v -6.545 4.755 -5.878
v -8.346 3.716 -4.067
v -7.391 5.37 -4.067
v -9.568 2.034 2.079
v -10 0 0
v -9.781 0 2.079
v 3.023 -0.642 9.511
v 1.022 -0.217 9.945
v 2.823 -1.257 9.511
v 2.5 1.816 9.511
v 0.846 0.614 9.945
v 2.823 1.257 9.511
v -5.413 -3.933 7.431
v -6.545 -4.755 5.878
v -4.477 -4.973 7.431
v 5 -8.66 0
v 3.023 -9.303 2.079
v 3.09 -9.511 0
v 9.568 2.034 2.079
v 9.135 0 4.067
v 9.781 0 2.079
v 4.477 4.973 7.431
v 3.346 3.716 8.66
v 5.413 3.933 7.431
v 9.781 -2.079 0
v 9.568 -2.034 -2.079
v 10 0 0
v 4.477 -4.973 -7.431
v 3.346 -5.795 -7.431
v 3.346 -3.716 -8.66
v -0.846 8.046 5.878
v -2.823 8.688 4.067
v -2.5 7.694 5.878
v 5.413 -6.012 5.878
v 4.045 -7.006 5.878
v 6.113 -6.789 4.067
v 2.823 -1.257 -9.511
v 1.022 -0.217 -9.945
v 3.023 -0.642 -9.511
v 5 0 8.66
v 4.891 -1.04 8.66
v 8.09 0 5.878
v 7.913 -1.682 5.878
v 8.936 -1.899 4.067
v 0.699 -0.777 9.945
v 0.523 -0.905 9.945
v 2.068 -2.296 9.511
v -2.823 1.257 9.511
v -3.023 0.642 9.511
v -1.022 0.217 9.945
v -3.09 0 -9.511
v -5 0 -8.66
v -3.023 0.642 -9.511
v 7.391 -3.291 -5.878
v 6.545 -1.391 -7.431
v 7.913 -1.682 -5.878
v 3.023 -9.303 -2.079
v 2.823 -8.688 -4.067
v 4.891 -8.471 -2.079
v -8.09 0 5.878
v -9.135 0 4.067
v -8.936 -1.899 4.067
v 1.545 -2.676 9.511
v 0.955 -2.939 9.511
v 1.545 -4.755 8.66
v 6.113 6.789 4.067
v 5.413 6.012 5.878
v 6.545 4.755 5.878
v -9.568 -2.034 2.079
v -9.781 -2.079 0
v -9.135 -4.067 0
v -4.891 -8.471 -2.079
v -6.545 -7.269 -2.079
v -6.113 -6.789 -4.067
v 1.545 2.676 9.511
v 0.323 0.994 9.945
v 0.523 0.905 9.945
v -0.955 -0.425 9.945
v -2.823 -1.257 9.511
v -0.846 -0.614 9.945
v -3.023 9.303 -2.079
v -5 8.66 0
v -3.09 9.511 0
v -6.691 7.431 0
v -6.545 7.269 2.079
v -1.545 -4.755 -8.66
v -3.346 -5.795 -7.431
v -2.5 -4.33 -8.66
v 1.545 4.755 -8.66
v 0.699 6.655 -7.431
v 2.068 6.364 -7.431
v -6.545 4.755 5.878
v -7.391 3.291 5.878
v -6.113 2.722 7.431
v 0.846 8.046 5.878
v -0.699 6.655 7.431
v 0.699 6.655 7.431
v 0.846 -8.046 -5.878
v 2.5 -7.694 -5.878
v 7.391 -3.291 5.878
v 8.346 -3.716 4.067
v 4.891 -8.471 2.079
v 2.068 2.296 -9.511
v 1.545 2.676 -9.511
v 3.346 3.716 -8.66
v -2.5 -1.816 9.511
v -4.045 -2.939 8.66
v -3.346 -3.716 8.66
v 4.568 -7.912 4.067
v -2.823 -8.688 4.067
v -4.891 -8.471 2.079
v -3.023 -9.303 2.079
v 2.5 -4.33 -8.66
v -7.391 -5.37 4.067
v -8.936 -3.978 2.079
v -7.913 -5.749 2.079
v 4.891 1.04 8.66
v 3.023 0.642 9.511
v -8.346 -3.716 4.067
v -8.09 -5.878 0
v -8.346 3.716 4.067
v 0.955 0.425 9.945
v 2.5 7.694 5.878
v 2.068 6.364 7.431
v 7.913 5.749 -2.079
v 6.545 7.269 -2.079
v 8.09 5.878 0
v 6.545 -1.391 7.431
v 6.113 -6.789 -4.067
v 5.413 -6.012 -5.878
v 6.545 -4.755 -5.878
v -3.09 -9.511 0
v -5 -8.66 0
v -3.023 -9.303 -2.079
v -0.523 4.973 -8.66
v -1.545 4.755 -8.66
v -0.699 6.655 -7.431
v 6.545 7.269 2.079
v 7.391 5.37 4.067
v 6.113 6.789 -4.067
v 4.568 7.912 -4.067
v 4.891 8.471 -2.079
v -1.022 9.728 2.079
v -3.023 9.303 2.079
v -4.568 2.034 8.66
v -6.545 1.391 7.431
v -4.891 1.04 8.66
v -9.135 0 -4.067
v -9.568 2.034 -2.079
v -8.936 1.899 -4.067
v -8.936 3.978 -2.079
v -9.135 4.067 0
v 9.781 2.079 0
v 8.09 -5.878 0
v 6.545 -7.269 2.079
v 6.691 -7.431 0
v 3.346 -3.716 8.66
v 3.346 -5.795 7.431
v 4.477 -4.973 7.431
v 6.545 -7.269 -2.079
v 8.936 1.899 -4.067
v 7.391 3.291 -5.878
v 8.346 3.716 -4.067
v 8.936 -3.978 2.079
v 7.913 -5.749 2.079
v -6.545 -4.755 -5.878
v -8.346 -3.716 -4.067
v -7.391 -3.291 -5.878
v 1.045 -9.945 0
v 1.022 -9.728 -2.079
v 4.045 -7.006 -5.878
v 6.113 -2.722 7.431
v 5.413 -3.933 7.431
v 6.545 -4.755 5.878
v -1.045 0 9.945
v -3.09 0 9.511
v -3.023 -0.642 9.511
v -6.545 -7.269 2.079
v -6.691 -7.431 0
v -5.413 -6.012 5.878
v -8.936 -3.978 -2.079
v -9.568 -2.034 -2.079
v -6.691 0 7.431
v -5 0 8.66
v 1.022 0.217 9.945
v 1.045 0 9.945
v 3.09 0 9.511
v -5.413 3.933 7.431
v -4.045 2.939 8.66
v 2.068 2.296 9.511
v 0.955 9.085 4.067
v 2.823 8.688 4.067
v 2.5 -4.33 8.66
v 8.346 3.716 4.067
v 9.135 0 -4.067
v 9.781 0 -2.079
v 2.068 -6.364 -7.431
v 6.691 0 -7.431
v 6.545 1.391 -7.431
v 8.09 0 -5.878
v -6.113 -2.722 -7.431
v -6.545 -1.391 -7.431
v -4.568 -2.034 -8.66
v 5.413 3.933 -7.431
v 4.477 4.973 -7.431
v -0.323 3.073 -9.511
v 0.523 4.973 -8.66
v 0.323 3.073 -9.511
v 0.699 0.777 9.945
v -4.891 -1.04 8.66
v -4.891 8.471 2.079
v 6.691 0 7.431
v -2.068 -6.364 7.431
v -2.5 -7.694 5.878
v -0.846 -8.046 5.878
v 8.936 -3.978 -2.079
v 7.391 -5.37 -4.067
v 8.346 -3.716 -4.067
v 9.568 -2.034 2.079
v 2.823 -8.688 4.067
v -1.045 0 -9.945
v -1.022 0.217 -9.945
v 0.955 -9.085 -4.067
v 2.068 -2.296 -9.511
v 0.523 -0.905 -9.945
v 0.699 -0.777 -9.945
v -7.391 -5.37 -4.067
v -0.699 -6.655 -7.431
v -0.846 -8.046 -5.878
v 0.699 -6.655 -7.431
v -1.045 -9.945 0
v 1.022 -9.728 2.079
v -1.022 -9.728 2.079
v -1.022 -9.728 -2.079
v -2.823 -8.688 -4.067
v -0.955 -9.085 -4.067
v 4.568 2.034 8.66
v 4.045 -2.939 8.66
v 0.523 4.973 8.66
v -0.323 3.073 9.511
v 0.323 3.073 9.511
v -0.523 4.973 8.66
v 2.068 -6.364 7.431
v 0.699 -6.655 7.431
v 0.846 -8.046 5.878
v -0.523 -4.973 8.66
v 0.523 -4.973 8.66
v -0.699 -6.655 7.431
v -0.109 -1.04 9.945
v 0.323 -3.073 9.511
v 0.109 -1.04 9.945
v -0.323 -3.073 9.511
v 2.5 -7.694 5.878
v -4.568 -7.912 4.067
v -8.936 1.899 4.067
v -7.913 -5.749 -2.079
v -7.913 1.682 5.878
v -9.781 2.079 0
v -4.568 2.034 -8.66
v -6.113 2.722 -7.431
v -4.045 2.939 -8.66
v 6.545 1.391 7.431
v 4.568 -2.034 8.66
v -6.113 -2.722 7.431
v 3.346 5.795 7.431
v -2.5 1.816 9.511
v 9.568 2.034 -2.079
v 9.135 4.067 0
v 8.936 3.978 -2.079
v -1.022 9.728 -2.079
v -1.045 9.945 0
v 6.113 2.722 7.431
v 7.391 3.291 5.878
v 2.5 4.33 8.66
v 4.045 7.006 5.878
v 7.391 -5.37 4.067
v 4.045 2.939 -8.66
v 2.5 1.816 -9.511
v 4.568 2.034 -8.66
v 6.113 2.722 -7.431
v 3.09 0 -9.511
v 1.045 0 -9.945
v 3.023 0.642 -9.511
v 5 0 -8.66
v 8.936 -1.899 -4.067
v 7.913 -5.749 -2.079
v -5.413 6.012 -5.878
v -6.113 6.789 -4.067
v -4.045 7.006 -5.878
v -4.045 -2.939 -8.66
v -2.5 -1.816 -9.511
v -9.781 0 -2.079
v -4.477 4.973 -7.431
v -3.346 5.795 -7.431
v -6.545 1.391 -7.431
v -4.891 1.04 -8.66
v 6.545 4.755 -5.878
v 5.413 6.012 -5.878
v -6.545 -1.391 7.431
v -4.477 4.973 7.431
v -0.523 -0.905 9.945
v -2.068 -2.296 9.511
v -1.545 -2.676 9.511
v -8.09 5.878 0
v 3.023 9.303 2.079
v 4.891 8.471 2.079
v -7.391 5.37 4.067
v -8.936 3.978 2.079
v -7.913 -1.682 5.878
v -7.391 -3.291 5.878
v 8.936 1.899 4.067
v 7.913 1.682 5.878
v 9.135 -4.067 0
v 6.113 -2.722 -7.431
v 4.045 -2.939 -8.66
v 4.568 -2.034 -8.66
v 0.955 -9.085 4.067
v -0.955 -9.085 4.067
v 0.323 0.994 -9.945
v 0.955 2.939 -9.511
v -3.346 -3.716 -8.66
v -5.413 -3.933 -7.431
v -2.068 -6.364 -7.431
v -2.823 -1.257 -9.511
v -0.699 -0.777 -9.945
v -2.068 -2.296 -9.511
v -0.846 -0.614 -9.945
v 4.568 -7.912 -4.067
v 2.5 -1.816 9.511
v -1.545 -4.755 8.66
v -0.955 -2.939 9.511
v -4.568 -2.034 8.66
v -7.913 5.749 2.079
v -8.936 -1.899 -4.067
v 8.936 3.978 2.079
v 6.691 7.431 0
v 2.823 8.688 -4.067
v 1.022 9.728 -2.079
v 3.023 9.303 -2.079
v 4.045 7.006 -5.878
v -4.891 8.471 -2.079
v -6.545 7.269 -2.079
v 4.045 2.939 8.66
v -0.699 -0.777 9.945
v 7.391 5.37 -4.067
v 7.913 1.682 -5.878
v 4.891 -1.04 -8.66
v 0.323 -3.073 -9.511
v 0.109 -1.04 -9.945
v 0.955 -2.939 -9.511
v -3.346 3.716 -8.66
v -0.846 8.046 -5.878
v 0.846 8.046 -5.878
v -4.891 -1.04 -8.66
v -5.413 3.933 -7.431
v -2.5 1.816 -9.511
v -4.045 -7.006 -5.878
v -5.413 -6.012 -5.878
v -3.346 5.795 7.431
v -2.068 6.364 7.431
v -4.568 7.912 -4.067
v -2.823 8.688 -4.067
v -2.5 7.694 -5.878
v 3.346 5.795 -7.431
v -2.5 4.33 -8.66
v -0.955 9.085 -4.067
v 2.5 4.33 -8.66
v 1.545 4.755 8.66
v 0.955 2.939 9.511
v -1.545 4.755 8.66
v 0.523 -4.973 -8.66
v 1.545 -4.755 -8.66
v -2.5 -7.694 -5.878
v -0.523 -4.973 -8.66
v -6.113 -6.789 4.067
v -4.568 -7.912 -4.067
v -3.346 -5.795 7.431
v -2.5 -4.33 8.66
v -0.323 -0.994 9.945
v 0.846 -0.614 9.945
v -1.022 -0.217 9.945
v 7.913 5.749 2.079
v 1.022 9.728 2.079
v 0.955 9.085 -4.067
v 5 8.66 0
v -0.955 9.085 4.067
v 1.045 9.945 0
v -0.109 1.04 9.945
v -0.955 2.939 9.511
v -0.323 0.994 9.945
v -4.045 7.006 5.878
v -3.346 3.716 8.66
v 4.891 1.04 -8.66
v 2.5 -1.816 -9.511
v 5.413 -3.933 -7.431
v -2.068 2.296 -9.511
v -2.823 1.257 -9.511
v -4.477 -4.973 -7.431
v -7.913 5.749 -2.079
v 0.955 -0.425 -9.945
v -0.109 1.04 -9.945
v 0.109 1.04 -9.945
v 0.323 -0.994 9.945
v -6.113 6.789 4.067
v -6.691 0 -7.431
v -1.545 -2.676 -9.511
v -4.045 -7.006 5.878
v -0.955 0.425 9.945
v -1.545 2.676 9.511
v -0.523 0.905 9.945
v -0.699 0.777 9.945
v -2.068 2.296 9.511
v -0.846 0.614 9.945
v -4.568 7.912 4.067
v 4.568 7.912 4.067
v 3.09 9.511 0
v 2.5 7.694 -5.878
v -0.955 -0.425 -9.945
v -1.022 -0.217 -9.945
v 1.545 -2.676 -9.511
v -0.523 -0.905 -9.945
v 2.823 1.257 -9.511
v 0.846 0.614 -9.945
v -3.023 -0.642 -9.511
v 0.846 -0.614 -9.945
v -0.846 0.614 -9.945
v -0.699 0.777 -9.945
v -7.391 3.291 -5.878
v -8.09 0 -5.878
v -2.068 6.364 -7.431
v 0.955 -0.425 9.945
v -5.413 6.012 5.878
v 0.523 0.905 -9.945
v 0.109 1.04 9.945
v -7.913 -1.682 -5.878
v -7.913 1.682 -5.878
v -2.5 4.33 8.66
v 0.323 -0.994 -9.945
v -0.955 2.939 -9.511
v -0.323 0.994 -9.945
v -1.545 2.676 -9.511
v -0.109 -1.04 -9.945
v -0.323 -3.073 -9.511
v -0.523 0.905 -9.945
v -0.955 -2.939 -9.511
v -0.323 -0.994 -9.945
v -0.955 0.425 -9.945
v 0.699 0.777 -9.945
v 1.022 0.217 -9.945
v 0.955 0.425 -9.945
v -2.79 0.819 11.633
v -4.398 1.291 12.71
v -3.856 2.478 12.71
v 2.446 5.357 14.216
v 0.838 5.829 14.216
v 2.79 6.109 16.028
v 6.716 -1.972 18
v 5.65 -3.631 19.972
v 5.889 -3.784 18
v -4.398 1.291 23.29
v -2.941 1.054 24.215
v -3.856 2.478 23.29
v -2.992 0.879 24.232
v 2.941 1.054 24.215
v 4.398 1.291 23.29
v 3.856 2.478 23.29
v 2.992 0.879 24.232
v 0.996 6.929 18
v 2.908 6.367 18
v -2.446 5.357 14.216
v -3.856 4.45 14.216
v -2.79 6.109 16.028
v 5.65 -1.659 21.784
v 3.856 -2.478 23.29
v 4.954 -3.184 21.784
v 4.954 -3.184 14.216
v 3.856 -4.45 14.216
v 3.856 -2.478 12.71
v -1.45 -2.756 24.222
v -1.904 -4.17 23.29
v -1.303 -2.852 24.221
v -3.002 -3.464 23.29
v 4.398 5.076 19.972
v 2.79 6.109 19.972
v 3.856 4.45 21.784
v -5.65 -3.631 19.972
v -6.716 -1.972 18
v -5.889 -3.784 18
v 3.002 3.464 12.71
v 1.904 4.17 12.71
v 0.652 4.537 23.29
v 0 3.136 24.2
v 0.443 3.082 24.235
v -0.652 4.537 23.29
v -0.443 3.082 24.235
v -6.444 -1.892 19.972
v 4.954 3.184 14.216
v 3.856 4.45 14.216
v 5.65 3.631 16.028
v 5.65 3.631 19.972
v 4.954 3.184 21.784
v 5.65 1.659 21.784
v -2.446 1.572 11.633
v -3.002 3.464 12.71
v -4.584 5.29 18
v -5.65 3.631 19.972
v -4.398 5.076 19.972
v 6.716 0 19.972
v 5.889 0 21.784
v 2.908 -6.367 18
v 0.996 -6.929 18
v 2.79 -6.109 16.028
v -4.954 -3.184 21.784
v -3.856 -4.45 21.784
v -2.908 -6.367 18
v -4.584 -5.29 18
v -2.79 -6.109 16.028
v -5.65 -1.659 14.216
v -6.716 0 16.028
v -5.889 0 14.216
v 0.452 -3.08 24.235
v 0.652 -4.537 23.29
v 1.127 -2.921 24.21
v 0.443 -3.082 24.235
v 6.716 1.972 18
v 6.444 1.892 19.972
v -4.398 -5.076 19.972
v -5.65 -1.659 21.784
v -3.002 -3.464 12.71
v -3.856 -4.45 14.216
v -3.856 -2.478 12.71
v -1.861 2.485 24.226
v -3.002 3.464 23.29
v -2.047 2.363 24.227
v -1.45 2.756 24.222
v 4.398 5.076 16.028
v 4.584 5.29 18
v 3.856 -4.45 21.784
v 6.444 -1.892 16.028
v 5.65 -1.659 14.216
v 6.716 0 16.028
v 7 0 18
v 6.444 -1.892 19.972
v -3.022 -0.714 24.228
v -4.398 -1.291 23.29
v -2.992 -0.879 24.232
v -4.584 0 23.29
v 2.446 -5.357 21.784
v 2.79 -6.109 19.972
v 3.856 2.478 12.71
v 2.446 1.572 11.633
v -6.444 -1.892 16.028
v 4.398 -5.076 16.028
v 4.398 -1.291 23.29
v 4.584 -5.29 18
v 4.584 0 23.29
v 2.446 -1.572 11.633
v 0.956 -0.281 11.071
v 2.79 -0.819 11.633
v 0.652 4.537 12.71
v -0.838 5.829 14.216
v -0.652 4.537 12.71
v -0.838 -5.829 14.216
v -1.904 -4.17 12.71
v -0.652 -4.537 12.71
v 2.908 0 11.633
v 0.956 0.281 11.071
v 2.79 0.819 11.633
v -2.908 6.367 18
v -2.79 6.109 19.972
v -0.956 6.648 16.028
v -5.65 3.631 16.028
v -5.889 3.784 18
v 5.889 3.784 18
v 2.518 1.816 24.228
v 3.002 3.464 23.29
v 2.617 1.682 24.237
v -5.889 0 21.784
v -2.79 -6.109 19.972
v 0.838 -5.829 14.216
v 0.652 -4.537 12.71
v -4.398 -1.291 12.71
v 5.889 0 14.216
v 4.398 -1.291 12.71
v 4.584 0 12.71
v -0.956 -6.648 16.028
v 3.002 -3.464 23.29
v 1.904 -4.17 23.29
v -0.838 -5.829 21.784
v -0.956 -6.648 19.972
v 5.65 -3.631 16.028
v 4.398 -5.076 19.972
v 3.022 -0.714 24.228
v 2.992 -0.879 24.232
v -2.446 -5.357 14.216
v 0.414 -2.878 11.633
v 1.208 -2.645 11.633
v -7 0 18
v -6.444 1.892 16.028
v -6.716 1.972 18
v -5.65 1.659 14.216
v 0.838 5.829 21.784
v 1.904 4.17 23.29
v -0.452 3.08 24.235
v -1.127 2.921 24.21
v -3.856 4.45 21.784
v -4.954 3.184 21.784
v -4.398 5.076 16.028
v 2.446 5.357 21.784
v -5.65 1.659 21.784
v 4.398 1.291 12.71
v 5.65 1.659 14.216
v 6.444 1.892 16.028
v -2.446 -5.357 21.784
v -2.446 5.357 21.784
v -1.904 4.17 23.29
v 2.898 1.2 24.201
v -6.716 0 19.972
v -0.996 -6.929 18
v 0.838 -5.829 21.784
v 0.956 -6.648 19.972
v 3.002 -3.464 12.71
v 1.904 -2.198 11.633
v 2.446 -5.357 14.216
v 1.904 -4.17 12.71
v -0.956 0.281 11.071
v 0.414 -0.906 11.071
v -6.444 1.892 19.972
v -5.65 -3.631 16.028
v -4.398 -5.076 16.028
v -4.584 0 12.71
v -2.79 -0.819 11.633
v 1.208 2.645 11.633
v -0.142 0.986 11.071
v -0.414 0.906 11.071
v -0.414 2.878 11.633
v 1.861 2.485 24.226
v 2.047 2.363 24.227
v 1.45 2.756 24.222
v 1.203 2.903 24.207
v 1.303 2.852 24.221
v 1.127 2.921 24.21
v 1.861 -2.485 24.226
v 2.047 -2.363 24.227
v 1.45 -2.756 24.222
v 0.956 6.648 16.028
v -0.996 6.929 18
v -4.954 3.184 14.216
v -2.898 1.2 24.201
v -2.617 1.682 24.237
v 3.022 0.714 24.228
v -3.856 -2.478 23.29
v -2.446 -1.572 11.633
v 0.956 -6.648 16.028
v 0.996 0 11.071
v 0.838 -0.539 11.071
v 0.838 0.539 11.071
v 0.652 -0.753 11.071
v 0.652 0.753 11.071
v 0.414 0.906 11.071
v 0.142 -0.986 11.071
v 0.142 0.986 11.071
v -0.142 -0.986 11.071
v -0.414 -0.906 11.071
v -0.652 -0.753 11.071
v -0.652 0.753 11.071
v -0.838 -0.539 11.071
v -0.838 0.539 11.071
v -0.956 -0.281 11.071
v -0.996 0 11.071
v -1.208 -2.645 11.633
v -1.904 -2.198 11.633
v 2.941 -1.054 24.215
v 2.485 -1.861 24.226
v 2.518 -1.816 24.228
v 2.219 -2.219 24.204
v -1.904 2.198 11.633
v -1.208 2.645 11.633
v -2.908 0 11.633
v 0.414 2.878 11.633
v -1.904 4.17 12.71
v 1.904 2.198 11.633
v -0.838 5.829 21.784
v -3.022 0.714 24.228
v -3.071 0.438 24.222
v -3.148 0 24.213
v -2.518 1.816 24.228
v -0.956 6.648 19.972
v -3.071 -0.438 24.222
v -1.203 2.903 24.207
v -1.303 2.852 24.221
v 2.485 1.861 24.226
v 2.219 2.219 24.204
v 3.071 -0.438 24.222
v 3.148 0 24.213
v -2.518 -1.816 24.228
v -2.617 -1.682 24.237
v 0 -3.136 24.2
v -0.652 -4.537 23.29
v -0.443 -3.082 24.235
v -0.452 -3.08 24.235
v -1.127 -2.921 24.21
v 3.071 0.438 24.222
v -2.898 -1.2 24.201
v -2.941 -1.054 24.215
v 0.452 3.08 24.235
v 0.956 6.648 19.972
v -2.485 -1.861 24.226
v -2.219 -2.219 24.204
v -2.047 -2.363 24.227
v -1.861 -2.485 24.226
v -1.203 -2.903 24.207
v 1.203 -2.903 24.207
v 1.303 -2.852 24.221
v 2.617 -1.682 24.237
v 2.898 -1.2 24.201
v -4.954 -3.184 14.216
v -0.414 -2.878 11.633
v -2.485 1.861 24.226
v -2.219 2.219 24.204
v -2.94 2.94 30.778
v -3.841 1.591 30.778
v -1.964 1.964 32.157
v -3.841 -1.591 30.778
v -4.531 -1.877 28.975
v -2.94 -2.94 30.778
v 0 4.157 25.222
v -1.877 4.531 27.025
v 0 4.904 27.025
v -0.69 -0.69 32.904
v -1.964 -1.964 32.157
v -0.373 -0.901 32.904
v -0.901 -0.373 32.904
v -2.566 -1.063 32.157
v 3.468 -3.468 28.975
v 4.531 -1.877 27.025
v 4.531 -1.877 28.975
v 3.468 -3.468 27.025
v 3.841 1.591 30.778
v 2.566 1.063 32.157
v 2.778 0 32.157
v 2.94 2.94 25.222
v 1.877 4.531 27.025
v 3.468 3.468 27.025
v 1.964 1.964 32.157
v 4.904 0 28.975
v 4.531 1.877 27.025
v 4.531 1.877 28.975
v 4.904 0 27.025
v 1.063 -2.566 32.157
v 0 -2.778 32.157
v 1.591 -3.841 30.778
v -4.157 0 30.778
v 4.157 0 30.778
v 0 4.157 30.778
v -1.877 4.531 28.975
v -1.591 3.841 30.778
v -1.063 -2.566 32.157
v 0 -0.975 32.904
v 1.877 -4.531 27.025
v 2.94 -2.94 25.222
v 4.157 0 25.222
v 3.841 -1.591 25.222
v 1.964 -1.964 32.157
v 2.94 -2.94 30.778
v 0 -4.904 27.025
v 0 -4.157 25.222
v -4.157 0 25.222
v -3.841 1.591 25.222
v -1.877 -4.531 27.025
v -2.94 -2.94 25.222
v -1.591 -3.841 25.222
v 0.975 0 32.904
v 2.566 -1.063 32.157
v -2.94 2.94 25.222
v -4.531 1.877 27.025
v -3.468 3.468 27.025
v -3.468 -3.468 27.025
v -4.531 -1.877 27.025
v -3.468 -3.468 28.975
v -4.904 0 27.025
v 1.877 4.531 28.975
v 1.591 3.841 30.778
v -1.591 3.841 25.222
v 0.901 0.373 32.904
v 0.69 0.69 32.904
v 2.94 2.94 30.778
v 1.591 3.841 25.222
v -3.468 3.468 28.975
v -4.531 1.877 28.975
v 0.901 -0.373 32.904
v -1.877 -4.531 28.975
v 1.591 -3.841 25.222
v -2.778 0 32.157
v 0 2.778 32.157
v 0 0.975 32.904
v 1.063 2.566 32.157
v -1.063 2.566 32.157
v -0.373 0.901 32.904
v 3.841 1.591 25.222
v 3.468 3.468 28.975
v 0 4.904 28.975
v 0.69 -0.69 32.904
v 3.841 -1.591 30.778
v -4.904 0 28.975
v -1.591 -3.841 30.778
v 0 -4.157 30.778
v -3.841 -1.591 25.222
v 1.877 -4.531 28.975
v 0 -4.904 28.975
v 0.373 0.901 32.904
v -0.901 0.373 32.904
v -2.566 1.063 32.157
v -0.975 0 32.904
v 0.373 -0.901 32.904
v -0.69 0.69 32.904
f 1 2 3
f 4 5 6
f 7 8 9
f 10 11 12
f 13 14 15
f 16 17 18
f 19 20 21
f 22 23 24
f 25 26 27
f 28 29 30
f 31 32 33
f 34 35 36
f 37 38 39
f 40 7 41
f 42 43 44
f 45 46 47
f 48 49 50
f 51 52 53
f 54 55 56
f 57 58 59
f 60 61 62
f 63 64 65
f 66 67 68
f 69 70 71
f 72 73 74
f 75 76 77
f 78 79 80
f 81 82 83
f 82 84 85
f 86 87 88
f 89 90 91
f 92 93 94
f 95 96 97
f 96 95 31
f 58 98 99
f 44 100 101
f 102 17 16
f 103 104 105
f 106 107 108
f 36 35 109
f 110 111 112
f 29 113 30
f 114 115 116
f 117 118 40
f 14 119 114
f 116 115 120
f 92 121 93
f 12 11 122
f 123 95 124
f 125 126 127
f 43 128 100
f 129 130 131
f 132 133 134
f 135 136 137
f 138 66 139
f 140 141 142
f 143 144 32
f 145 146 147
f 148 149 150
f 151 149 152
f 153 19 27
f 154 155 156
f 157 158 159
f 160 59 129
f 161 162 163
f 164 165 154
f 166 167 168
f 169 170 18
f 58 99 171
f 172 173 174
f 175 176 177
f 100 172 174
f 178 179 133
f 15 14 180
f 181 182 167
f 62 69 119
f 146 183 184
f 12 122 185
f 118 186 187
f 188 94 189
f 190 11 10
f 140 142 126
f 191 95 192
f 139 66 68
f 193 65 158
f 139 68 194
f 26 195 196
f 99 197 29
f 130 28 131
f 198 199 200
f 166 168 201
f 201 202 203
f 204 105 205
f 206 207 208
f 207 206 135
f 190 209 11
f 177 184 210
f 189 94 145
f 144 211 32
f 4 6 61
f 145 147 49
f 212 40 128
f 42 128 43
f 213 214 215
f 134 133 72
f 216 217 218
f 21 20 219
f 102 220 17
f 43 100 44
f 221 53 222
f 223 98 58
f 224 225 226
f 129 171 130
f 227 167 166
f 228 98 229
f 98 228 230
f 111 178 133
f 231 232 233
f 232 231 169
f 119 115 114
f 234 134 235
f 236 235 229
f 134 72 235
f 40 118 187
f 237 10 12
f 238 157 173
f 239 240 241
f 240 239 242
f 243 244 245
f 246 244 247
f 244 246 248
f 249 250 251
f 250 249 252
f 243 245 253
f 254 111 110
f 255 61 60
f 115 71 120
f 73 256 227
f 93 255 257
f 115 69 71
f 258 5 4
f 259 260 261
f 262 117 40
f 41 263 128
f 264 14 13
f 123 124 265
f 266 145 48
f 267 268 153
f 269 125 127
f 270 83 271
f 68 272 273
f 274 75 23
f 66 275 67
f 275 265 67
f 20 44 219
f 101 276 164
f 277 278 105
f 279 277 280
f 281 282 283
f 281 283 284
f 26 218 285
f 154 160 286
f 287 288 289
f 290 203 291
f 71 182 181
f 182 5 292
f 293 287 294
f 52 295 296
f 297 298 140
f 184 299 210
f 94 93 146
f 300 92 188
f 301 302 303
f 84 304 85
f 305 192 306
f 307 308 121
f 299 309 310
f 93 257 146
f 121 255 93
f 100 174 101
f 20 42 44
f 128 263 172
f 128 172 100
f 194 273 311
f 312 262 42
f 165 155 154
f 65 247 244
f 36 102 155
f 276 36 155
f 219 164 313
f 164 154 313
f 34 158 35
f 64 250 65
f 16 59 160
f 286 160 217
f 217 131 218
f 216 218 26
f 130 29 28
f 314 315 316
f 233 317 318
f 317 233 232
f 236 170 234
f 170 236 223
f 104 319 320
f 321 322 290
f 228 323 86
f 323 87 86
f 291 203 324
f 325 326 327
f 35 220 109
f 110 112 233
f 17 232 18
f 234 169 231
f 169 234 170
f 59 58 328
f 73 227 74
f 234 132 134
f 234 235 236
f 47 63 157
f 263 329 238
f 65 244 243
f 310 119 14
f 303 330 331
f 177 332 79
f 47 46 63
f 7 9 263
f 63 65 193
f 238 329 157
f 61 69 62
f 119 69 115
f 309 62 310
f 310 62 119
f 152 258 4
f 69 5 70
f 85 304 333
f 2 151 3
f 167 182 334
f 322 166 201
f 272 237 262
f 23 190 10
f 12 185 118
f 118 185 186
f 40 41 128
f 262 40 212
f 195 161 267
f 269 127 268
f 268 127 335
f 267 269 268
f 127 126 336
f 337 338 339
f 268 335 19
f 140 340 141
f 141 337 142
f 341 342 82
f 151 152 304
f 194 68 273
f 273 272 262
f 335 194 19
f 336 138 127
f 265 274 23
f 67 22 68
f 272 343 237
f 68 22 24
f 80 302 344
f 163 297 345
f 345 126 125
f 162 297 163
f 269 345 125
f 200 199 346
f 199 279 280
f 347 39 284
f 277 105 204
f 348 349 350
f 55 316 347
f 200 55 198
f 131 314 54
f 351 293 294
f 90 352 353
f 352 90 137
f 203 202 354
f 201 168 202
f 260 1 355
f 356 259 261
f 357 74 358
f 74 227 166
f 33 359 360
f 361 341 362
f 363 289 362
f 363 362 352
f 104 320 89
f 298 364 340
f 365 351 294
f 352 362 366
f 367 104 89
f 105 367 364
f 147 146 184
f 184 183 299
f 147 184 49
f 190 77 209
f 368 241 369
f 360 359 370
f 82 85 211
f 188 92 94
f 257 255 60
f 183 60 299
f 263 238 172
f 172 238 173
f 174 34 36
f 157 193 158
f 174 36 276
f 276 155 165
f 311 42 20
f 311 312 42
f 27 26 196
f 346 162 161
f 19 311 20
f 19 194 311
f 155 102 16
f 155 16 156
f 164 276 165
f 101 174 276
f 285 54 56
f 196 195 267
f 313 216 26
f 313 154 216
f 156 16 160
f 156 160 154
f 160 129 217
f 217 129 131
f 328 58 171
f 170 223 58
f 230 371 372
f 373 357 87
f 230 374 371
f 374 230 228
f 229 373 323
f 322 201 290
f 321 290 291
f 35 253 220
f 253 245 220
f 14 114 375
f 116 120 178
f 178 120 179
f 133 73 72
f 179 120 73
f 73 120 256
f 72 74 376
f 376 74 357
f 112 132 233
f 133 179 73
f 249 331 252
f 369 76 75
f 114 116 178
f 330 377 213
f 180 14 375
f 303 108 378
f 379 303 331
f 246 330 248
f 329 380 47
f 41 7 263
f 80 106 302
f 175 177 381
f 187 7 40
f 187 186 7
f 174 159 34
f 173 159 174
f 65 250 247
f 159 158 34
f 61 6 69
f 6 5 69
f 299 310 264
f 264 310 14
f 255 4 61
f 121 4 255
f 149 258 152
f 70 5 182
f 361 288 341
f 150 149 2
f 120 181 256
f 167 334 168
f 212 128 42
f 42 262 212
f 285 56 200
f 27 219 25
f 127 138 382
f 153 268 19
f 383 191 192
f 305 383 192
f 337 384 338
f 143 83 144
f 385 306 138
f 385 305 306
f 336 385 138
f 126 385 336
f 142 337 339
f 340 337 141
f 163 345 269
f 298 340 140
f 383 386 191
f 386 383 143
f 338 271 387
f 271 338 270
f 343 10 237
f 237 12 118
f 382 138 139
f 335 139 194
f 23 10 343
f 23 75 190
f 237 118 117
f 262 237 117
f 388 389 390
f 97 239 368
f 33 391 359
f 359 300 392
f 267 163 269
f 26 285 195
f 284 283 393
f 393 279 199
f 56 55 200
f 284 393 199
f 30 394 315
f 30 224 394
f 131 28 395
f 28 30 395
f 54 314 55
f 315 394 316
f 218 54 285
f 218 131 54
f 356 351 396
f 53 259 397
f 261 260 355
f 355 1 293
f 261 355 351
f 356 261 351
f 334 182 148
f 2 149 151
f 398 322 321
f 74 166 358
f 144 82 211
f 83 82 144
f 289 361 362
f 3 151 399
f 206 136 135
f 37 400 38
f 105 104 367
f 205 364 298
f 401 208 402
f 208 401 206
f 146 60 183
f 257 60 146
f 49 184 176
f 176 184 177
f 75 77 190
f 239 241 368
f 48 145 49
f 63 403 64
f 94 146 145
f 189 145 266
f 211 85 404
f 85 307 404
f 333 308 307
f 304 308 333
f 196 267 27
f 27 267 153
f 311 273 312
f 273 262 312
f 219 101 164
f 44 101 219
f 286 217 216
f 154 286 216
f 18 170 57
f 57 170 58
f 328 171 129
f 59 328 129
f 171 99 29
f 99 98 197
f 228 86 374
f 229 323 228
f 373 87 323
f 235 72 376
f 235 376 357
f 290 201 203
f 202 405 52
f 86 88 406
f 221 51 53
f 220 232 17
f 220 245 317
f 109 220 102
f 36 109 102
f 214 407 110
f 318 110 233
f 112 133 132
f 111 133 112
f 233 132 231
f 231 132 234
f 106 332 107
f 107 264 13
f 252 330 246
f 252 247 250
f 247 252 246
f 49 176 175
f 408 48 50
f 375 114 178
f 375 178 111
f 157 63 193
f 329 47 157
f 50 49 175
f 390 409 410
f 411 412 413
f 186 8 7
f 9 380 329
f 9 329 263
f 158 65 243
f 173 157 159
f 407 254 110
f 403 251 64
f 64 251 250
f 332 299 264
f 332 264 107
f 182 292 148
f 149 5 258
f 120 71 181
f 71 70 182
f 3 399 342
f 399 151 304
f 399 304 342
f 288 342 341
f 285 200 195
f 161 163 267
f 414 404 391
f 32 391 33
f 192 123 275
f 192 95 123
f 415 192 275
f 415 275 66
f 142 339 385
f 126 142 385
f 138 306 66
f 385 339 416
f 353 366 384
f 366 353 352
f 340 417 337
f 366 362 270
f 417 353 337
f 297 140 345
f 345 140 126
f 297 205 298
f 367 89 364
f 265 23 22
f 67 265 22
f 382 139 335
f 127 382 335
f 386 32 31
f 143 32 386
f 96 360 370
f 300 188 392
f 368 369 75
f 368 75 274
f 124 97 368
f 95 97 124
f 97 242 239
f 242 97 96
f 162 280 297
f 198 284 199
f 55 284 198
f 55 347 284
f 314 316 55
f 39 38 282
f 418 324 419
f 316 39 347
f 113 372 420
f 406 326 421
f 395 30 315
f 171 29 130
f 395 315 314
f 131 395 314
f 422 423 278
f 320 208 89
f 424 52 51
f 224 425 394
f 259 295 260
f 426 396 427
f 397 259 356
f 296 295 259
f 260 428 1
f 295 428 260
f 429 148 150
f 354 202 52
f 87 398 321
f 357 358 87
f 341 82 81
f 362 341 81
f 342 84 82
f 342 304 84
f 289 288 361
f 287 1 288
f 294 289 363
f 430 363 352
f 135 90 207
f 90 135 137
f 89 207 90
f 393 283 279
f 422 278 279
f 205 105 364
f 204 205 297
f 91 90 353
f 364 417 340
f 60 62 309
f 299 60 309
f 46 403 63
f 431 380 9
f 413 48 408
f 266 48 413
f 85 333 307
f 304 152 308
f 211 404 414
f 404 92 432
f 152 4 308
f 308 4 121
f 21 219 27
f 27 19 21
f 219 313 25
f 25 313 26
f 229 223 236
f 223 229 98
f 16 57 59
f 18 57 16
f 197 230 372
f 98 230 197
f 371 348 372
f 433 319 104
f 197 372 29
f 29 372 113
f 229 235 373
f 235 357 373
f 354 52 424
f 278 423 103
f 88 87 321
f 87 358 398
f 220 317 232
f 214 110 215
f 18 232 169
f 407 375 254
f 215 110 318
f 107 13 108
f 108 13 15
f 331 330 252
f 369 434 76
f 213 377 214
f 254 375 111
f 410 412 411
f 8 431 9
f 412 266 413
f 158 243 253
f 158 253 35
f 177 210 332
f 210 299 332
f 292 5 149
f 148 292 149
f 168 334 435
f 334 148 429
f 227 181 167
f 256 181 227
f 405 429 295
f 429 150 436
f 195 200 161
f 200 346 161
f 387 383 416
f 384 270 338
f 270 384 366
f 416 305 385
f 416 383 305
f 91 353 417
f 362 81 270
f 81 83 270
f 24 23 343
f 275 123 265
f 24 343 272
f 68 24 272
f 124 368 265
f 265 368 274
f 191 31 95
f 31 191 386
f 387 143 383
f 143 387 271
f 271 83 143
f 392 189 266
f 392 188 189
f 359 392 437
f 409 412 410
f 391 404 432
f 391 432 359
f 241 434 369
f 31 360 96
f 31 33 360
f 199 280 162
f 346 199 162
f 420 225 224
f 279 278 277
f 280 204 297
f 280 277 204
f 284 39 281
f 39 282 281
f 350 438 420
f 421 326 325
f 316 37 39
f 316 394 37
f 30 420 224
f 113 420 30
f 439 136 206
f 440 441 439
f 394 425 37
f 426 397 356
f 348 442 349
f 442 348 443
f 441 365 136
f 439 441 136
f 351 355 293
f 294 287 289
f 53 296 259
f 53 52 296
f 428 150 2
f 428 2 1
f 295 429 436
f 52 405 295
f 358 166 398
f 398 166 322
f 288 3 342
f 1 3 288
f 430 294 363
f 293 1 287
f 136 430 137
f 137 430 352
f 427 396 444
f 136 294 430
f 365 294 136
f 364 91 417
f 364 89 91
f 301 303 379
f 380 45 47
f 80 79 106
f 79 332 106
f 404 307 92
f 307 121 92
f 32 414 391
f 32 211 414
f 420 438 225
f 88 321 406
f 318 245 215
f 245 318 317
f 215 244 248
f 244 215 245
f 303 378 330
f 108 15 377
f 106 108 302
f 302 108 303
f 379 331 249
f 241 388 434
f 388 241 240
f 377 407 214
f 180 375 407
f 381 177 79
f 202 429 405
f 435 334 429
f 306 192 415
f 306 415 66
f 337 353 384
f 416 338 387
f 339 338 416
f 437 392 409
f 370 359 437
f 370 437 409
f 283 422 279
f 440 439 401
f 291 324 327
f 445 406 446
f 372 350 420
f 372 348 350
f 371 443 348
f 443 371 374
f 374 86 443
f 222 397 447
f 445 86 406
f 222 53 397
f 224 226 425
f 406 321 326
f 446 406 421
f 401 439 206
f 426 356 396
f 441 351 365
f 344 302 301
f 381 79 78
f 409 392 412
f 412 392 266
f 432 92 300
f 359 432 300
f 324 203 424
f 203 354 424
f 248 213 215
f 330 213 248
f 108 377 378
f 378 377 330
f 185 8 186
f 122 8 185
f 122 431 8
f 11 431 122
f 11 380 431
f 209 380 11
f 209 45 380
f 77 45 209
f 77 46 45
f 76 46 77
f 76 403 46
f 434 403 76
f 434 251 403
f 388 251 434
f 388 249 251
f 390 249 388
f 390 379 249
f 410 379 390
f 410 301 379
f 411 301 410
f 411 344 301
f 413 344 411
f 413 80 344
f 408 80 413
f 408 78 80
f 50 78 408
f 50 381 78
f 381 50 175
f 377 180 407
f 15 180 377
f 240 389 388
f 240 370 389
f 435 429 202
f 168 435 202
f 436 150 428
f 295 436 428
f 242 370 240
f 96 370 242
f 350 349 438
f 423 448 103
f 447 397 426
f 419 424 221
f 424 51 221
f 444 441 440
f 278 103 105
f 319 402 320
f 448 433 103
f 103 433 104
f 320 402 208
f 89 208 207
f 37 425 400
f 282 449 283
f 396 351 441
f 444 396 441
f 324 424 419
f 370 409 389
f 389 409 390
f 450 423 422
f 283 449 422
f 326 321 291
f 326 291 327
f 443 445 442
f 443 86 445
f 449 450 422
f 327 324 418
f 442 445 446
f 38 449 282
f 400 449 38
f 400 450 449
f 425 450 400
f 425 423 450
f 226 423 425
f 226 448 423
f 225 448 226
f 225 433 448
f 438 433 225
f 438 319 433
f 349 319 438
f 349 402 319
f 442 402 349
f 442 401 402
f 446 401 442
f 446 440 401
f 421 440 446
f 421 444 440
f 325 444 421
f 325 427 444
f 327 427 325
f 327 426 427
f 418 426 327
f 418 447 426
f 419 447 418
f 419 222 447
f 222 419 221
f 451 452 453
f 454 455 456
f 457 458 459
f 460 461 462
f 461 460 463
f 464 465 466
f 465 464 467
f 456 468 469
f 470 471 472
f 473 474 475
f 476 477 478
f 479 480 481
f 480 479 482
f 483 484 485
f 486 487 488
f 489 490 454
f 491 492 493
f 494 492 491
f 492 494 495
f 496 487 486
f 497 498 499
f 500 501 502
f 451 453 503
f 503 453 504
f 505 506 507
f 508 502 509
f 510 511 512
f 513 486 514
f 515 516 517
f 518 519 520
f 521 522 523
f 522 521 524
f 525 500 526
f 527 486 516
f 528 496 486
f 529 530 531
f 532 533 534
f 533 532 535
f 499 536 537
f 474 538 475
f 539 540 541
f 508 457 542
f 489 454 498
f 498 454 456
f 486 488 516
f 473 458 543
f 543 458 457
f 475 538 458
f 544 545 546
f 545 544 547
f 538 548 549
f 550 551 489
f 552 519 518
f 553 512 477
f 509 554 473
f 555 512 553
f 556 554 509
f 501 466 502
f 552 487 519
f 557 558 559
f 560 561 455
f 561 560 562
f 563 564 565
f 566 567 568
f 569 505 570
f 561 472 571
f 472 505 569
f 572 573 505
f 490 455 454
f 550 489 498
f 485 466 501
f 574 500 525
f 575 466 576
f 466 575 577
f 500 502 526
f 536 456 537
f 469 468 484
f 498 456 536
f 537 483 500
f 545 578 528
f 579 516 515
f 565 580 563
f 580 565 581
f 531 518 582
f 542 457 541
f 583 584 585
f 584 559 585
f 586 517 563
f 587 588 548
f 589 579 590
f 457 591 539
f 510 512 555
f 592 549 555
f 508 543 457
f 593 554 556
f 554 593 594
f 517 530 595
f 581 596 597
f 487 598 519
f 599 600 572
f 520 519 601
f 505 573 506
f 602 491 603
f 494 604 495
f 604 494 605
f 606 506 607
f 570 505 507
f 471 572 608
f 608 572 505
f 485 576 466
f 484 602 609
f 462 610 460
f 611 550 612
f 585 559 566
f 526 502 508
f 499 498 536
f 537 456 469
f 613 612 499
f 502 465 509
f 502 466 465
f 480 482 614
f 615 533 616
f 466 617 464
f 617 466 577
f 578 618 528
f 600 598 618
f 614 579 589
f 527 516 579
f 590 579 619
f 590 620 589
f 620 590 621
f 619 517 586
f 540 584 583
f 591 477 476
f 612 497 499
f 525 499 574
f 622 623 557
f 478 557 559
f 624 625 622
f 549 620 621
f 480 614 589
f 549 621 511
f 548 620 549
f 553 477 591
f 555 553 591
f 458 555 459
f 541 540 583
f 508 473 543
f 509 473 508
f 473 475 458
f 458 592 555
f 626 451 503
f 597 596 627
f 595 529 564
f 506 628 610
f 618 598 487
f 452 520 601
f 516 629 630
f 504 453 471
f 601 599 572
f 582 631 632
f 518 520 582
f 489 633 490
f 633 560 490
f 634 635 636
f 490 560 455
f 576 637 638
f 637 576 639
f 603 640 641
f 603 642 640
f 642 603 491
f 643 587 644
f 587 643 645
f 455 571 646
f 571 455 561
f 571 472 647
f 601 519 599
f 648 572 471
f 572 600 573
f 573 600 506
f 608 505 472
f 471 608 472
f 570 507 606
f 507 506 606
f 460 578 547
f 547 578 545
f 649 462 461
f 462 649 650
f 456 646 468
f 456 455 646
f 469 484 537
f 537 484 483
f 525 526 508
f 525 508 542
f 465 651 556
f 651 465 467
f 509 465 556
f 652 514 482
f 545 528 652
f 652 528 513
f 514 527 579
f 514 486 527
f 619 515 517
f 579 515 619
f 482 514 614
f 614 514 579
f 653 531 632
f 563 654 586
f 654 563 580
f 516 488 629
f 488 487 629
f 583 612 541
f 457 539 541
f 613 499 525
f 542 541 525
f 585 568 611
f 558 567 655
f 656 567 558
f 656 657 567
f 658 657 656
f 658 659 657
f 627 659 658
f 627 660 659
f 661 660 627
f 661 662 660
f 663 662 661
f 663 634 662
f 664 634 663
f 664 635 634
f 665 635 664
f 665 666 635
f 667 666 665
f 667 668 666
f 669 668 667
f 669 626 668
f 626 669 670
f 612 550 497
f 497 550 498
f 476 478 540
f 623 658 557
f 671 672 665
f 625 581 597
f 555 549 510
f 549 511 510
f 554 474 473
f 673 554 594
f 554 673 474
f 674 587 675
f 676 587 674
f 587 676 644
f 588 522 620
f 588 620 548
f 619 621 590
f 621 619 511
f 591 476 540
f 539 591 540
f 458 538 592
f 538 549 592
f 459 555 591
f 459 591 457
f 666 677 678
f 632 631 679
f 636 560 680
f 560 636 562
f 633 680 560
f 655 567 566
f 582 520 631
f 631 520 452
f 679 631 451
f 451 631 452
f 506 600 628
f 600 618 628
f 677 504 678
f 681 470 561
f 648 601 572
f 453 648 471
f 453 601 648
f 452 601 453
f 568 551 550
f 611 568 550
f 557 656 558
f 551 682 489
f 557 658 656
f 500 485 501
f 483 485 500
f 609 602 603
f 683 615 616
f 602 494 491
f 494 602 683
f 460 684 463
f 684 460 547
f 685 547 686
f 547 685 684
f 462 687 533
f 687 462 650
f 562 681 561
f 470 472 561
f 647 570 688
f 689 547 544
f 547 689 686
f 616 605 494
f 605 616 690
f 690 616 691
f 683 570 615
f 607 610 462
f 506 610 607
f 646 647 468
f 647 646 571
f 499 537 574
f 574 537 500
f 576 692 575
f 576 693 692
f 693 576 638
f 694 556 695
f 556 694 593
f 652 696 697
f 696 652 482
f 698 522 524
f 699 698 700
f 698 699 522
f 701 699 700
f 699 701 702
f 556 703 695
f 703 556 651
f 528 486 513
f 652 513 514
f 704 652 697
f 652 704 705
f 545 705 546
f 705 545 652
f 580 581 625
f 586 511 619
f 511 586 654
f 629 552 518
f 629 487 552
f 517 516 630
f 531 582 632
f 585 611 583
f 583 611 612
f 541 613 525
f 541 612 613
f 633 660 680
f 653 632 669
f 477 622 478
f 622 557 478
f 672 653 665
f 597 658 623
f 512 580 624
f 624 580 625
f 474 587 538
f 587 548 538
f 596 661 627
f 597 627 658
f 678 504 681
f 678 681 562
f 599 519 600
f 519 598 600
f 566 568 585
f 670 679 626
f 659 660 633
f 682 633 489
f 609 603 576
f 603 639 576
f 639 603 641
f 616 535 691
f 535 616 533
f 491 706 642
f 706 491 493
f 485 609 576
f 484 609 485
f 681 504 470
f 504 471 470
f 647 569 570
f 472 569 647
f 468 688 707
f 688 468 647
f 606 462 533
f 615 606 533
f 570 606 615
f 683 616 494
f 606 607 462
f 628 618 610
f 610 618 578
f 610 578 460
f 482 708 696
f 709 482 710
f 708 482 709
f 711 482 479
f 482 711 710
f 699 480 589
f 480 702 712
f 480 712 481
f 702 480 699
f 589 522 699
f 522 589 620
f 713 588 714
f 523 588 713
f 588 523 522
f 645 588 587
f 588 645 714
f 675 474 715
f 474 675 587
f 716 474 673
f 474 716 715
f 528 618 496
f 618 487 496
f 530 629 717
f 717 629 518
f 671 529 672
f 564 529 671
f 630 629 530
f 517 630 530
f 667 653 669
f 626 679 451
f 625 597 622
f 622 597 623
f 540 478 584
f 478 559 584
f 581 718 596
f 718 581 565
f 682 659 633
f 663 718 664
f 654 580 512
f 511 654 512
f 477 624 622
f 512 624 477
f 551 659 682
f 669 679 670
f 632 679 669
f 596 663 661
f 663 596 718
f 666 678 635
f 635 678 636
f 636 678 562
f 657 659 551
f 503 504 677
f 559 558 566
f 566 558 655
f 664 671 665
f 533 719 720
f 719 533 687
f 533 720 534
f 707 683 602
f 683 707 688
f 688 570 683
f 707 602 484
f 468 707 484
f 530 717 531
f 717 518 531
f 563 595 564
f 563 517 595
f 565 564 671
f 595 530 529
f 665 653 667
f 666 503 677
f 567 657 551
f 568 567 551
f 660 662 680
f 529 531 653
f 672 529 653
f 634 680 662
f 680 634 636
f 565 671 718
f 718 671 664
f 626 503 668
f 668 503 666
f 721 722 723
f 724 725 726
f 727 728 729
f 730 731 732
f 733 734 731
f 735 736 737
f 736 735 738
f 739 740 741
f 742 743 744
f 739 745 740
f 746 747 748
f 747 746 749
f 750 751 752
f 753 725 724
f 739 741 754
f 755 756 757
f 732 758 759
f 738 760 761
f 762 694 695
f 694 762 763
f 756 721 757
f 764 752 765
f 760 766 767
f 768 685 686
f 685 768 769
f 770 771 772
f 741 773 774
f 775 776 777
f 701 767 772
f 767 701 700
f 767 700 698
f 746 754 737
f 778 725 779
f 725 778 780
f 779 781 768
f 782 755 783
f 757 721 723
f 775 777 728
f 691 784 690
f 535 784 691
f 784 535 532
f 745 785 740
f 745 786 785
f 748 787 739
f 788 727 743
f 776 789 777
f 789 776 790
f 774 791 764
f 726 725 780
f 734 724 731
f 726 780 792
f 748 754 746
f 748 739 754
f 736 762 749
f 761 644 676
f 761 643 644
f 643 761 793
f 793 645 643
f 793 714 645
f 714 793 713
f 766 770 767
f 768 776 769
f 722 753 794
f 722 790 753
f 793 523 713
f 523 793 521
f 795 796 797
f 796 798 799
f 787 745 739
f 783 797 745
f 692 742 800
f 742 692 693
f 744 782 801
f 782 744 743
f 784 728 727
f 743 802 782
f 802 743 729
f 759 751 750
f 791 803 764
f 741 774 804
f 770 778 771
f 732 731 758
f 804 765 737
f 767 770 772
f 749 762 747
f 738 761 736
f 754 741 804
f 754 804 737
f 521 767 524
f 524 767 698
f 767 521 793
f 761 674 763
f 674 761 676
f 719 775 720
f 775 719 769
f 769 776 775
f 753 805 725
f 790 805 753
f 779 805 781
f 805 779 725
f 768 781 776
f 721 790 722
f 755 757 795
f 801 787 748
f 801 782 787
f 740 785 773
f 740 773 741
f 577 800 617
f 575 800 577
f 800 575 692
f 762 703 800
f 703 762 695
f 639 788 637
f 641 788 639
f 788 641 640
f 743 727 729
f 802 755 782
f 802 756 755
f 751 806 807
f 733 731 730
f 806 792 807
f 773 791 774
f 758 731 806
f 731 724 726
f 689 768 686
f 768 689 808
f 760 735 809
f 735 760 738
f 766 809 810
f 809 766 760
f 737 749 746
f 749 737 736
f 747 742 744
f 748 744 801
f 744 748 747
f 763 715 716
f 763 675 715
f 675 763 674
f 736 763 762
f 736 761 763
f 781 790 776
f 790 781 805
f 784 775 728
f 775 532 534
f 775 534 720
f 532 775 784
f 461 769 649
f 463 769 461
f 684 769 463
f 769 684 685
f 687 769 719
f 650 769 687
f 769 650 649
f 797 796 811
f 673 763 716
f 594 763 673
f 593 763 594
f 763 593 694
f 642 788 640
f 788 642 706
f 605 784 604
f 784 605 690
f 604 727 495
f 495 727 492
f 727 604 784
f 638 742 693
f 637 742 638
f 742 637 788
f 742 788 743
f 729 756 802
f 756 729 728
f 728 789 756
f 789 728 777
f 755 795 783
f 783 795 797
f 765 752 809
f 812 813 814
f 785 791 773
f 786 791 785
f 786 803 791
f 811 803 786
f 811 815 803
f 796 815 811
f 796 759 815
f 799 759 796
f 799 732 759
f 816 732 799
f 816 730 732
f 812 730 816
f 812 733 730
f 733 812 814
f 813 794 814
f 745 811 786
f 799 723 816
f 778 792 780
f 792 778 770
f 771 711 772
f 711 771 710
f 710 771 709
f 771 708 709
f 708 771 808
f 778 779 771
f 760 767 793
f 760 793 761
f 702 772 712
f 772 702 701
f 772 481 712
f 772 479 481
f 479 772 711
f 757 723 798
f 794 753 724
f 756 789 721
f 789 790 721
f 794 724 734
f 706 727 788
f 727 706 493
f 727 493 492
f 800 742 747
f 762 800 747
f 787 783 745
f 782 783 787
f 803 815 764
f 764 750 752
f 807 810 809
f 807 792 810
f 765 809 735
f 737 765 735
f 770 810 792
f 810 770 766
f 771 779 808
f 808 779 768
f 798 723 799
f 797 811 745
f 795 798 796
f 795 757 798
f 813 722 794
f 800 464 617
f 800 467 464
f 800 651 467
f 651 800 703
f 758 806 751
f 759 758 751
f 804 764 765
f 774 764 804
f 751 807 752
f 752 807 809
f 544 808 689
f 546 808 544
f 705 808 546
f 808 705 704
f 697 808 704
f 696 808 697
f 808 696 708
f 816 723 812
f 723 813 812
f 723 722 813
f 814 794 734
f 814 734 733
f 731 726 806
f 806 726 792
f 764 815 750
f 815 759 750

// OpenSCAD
union() {
  sphere(r=10);
  translate([0,0,18]) sphere(r=7);
  translate([0,0,28]) sphere(r=5);
}
